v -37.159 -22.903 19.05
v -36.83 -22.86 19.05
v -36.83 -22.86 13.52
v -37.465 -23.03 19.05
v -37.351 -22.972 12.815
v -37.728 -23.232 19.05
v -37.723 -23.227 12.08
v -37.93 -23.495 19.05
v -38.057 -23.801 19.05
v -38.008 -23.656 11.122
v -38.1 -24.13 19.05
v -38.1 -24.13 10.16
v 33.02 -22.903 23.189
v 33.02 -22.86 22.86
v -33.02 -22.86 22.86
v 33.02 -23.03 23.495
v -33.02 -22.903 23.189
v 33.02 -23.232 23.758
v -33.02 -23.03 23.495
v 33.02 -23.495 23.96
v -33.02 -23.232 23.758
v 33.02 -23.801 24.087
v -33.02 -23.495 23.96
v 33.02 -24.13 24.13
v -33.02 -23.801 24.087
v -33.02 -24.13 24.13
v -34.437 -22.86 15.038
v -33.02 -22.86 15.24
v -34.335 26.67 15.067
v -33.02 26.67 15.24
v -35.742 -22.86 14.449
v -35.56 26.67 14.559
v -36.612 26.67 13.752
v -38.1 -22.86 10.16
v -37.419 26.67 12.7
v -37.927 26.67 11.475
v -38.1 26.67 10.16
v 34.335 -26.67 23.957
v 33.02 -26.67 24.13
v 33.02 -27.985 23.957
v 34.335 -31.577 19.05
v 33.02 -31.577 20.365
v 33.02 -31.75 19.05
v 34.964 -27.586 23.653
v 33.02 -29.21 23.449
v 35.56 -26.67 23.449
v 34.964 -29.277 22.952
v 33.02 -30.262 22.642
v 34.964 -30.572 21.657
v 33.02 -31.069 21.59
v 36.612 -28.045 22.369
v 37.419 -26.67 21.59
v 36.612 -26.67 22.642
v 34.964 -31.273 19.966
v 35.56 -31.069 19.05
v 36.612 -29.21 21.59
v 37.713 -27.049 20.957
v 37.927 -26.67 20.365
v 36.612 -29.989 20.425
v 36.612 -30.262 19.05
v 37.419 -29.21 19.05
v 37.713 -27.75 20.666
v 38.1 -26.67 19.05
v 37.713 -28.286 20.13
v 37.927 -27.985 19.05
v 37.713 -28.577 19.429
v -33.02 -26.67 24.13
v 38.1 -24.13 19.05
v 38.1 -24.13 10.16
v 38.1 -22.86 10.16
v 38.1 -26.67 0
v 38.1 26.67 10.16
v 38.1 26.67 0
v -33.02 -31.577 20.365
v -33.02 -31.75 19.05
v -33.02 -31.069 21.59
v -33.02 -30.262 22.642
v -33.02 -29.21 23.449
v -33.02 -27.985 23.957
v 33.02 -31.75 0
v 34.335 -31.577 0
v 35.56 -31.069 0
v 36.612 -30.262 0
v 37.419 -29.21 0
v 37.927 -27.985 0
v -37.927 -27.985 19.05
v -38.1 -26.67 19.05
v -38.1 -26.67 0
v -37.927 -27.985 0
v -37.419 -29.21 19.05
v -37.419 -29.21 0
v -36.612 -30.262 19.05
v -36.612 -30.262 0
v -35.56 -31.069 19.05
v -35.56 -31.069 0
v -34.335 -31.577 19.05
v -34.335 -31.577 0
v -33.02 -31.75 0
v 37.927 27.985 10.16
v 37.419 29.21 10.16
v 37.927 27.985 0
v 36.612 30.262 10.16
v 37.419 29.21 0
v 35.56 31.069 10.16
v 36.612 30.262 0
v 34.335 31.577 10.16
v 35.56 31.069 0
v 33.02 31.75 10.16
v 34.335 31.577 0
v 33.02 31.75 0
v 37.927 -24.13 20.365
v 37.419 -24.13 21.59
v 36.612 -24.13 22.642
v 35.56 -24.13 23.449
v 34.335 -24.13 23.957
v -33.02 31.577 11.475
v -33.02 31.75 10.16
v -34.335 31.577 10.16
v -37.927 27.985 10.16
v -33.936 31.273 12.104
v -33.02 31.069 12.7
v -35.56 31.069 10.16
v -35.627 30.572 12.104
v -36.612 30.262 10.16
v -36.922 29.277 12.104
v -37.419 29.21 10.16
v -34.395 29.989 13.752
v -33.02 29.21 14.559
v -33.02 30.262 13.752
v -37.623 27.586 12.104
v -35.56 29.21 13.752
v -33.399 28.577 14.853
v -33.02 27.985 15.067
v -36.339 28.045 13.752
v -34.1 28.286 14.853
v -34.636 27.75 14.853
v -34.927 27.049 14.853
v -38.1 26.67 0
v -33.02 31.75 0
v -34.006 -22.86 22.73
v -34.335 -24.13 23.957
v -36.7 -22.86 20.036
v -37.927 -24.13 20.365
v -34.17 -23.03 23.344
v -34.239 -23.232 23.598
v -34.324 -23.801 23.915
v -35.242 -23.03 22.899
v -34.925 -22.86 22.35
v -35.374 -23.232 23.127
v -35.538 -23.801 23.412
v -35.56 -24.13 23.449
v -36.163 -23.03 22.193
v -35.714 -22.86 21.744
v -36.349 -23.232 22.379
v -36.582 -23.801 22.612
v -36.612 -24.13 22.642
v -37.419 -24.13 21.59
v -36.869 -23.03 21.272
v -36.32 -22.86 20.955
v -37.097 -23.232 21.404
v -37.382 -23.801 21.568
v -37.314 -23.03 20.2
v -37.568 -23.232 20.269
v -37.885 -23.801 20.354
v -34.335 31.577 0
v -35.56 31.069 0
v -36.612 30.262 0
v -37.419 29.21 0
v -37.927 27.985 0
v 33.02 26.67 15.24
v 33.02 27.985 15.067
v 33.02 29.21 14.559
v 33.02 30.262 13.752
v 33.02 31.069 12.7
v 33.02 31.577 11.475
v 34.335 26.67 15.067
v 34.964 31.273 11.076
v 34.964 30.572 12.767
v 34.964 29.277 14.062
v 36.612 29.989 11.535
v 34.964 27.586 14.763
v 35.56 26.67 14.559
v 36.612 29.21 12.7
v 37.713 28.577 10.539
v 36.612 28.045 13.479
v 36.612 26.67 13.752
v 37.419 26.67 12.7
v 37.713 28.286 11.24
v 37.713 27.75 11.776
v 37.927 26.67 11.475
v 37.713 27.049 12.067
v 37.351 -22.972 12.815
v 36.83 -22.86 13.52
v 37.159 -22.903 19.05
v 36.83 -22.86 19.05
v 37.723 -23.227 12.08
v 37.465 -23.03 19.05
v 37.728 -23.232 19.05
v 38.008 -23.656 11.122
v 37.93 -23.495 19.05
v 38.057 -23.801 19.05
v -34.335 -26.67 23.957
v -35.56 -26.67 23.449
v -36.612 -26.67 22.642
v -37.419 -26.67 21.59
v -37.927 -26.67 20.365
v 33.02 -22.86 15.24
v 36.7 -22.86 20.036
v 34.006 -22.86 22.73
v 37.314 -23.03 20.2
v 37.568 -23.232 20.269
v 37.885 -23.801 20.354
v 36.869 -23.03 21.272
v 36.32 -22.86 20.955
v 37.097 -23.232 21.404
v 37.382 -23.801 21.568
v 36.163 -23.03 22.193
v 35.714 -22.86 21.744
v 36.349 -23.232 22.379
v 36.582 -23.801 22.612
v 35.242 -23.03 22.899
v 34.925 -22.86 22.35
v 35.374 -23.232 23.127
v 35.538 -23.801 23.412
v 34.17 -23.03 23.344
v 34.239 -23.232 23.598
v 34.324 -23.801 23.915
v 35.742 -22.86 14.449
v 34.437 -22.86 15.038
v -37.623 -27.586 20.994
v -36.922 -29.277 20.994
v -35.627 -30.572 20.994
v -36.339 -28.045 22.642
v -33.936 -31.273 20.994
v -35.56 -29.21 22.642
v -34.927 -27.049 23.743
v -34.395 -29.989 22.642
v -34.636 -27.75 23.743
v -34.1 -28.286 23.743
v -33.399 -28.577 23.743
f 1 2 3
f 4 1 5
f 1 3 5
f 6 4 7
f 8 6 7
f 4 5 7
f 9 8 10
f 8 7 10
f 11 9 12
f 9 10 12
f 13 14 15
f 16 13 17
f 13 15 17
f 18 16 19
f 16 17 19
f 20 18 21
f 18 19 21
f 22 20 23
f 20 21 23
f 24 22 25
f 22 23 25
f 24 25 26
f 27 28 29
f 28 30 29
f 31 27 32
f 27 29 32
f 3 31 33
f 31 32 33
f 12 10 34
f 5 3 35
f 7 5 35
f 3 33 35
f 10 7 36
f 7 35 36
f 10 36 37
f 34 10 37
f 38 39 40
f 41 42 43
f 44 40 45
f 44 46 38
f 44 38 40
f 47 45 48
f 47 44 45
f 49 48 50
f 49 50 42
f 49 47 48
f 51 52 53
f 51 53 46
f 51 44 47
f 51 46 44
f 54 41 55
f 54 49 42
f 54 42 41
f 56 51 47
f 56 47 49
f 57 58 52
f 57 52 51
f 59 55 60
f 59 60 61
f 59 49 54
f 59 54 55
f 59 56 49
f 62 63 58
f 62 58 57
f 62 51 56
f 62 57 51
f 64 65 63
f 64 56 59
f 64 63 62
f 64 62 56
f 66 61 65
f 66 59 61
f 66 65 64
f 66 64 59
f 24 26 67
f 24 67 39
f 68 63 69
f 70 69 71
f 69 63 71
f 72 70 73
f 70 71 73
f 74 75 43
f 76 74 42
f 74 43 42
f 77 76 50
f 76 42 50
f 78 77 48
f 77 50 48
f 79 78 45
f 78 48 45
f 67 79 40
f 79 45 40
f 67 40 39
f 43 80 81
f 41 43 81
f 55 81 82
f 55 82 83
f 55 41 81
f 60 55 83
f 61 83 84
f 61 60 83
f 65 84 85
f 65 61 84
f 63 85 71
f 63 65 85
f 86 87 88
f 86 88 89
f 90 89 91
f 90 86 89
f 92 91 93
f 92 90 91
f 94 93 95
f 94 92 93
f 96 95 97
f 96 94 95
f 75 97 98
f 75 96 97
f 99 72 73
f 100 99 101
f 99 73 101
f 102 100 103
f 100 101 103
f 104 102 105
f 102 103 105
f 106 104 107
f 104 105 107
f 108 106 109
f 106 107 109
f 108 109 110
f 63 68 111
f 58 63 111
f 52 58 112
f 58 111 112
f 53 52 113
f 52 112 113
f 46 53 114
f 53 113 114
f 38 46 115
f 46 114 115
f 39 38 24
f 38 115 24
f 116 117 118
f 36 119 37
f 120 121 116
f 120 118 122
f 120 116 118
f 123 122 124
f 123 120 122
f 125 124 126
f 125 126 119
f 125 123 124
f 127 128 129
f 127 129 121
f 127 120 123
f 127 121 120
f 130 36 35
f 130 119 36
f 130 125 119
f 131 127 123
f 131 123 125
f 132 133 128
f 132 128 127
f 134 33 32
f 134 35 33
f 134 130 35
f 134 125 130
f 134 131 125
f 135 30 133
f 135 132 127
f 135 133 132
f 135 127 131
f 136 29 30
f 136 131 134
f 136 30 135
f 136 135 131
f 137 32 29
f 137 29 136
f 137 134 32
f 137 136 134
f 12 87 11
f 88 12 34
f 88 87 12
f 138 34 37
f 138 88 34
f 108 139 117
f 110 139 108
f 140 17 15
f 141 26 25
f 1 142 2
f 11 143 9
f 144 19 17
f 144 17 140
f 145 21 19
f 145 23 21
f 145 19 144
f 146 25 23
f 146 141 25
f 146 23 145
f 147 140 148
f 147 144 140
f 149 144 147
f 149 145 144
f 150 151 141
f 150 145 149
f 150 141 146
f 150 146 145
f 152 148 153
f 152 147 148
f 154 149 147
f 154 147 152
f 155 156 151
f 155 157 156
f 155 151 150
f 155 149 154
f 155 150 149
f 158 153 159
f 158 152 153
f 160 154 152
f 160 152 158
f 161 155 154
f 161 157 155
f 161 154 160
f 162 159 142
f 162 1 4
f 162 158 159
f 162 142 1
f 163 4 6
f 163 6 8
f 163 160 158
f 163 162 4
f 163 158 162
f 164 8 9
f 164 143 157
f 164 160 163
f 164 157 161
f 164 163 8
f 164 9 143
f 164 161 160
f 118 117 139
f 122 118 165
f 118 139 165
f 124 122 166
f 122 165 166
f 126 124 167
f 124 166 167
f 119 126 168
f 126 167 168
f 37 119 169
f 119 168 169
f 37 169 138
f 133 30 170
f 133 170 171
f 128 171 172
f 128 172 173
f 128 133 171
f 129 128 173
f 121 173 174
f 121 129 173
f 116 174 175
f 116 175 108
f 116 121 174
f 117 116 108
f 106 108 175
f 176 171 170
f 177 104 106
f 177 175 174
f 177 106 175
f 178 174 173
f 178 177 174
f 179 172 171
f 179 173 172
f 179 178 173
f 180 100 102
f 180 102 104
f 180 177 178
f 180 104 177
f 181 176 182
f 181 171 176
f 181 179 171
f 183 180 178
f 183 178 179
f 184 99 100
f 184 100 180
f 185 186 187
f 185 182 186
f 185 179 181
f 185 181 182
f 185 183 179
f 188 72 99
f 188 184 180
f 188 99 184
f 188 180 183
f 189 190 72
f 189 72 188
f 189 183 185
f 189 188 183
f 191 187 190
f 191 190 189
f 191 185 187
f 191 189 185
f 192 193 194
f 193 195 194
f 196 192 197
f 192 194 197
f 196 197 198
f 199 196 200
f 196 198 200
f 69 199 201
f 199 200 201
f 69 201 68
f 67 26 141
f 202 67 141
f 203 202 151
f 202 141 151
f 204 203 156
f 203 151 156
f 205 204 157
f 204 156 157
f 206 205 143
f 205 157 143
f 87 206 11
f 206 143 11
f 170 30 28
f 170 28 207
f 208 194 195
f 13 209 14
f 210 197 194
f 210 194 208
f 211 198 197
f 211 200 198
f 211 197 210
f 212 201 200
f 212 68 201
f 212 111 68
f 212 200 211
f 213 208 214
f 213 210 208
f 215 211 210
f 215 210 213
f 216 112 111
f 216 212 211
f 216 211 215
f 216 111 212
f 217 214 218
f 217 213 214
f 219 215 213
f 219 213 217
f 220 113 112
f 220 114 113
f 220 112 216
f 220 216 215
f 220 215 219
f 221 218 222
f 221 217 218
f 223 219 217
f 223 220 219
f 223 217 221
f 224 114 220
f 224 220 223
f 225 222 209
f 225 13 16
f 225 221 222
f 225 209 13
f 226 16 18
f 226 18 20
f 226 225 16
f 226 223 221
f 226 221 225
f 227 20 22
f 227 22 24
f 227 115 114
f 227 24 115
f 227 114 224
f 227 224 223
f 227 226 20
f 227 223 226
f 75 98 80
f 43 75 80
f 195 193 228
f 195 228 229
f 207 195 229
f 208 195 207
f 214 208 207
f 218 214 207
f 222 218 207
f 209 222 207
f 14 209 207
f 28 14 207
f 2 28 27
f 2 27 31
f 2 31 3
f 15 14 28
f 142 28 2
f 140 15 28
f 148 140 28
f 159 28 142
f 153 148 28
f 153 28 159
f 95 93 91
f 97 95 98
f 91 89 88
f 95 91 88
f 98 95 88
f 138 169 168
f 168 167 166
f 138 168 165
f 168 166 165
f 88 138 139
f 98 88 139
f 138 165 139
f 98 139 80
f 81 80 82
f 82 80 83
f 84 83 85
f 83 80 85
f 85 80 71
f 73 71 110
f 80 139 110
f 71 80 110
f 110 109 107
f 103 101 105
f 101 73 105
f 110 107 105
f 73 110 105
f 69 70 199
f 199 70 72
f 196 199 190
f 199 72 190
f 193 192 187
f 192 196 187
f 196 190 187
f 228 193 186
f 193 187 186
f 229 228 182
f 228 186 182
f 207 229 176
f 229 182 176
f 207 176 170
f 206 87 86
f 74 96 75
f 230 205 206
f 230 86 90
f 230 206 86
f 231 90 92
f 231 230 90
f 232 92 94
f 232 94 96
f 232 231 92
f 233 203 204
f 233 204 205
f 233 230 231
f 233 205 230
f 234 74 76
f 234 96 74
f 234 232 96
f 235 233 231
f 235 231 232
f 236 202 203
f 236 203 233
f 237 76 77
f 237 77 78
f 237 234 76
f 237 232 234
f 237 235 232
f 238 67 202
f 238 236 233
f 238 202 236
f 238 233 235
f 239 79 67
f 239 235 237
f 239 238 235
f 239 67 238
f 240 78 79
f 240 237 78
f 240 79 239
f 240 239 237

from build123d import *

# Parameters (mm, degrees)
F0_W         = 76.2
F0_H         = 63.5
F1_DEPTH     = 15.24
F2_W         = 76.2
F2_H         = 8.89
F3_DEPTH     = 8.89
F4_R         = 5.08
F5_T1_DEPTH  = 16.51
F5_T3_DEPTH  = 49.53
F5_T5_DEPTH  = 66.04
F5_T7_DEPTH  = 22.86
F5_S11_W     = 5.08
F5_S11_H     = 5.08
F5_T12_DEPTH = 5.08
F5_S17_W     = 5.08
F5_S17_H     = 5.08
F5_T18_DEPTH = 5.08
F5_S23_W     = 5.08
F5_S23_H     = 5.08
F5_T24_DEPTH = 5.08
F5_S29_W     = 5.08
F5_S29_H     = 5.08
F5_T30_DEPTH = 5.08
F6_R         = 1.27


# Not quite as in the source:
# - a fillet or chamfer that OpenCascade refuses, or shapes differently, is made with other operations: its cross-section is extruded or revolved along the edge and cut away or added


with BuildPart() as f1:
    # F0 (on Top) → F1 (new body)
    with BuildSketch(Plane.XY):
        Rectangle(F0_W, F0_H)
    extrude(amount=F1_DEPTH)

    # F2 (on face) → F3 (join)
    with BuildSketch(Plane.XY.offset(15.24)):
        with Locations((0, -27.305)):
            Rectangle(F2_W, F2_H)
    extrude(amount=F3_DEPTH)

    # F4
    f4_edges = [f1.edges().sort_by_distance(p)[0] for p in [
        (38.1, -31.75, 12.065),
        (-38.1, -31.75, 12.065),
        (0, -31.75, 24.13),
    ]]
    fillet(f4_edges, radius=F4_R)

    # F5: fillet of radius 5.08 on 7 edges, made by hand

    # F5_s2 → F5_t1 (cut)
    with BuildSketch(Plane.XZ.offset(10.16)):
        with BuildLine():
            ThreePointArc((-33.02, 24.13), (-36.6121024484, 22.6421024484), (-38.1, 19.05))
            Line((-38.1, 19.05), (-38.1, 24.13))
            Line((-38.1, 24.13), (-33.02, 24.13))
        make_face()
        with BuildLine():
            ThreePointArc((38.1, 19.05), (36.6121024484, 22.6421024484), (33.02, 24.13))
            Line((33.02, 24.13), (38.1, 24.13))
            Line((38.1, 24.13), (38.1, 19.05))
        make_face()
    extrude(amount=F5_T1_DEPTH, mode=Mode.SUBTRACT)

    # F5_s4 → F5_t3 (cut)
    with BuildSketch(Plane.XZ.offset(-26.67)):
        with BuildLine():
            ThreePointArc((-33.02, 15.24), (-36.6121024484, 13.7521024484), (-38.1, 10.16))
            Line((-38.1, 10.16), (-38.1, 15.24))
            Line((-38.1, 15.24), (-33.02, 15.24))
        make_face()
        with BuildLine():
            ThreePointArc((38.1, 10.16), (36.6121024484, 13.7521024484), (33.02, 15.24))
            Line((33.02, 15.24), (38.1, 15.24))
            Line((38.1, 15.24), (38.1, 10.16))
        make_face()
    extrude(amount=F5_T3_DEPTH, mode=Mode.SUBTRACT)

    # F5_s6 → F5_t5 (cut)
    with BuildSketch(Plane.YZ.offset(-33.02)):
        with BuildLine():
            ThreePointArc((26.67, 15.24), (30.2621024484, 13.7521024484), (31.75, 10.16))
            Line((31.75, 10.16), (31.75, 15.24))
            Line((31.75, 15.24), (26.67, 15.24))
        make_face()
    extrude(amount=F5_T5_DEPTH, mode=Mode.SUBTRACT)

    # F5_s8 → F5_t7 (cut)
    with BuildSketch(Plane.XY.offset(-12.7)):
        with BuildLine():
            ThreePointArc((38.1, 26.67), (36.6121024484, 30.2621024484), (33.02, 31.75))
            Line((33.02, 31.75), (38.1, 31.75))
            Line((38.1, 31.75), (38.1, 26.67))
        make_face()
        with BuildLine():
            ThreePointArc((-33.02, 31.75), (-36.6121024484, 30.2621024484), (-38.1, 26.67))
            Line((-38.1, 26.67), (-38.1, 31.75))
            Line((-38.1, 31.75), (-33.02, 31.75))
        make_face()
    extrude(amount=F5_T7_DEPTH, mode=Mode.SUBTRACT)


with BuildPart() as f5_tool10:
    # F5_s11 → F5_t12 (new body)
    with BuildSketch(Plane.YZ.offset(33.02)):
        with Locations((-29.21, 21.59)):
            Rectangle(F5_S11_W, F5_S11_H)
    extrude(amount=F5_T12_DEPTH)

    # F5_s13 → F5_t14 (revolve, cut)
    with BuildSketch(Plane(origin=(33.02, -26.67, 19.05), x_dir=(0, 0.7071067812, -0.7071067812), z_dir=(0, -0.7071067812, -0.7071067812))):
        with BuildLine():
            ThreePointArc((0, -5.08), (5.08, 0), (0, 5.08))
            Line((0, 5.08), (0, -5.08))
        make_face()
    revolve(axis=Axis((33.02, -26.67, 19.05), (1, 0, 0)), mode=Mode.SUBTRACT)


with BuildPart() as f1_1:
    add(f1.part)

    # F5_t9: cut F5_tool10
    add(f5_tool10.part, mode=Mode.SUBTRACT)


with BuildPart() as f5_tool16:
    # F5_s17 → F5_t18 (new body)
    with BuildSketch(Plane.XY.offset(19.05)):
        with Locations((-35.56, -29.21)):
            Rectangle(F5_S17_W, F5_S17_H)
    extrude(amount=F5_T18_DEPTH)

    # F5_s19 → F5_t20 (revolve, cut)
    with BuildSketch(Plane(origin=(-33.02, -26.67, 19.05), x_dir=(0.7071067812, 0.7071067812, 0), z_dir=(0.7071067812, -0.7071067812, 0))):
        with BuildLine():
            ThreePointArc((0, -5.08), (5.08, 0), (0, 5.08))
            Line((0, 5.08), (0, -5.08))
        make_face()
    revolve(axis=Axis((-33.02, -26.67, 19.05), (0, 0, 1)), mode=Mode.SUBTRACT)


with BuildPart() as f1_2:
    add(f1_1.part)

    # F5_t15: cut F5_tool16
    add(f5_tool16.part, mode=Mode.SUBTRACT)


with BuildPart() as f5_tool22:
    # F5_s23 → F5_t24 (new body)
    with BuildSketch(Plane.XY.offset(10.16)):
        with Locations((-35.56, 29.21)):
            Rectangle(F5_S23_W, F5_S23_H)
    extrude(amount=F5_T24_DEPTH)

    # F5_s25 → F5_t26 (revolve, cut)
    with BuildSketch(Plane(origin=(-33.02, 26.67, 10.16), x_dir=(0.7071067812, -0.7071067812, 0), z_dir=(-0.7071067812, -0.7071067812, 0))):
        with BuildLine():
            ThreePointArc((0, -5.08), (5.08, 0), (0, 5.08))
            Line((0, 5.08), (0, -5.08))
        make_face()
    revolve(axis=Axis((-33.02, 26.67, 10.16), (0, 0, 1)), mode=Mode.SUBTRACT)


with BuildPart() as f1_3:
    add(f1_2.part)

    # F5_t21: cut F5_tool22
    add(f5_tool22.part, mode=Mode.SUBTRACT)


with BuildPart() as f5_tool28:
    # F5_s29 → F5_t30 (new body)
    with BuildSketch(Plane.YZ.offset(33.02)):
        with Locations((29.21, 12.7)):
            Rectangle(F5_S29_W, F5_S29_H)
    extrude(amount=F5_T30_DEPTH)

    # F5_s31 → F5_t32 (revolve, cut)
    with BuildSketch(Plane(origin=(33.02, 26.67, 10.16), x_dir=(0, -0.7071067812, -0.7071067812), z_dir=(0, -0.7071067812, 0.7071067812))):
        with BuildLine():
            ThreePointArc((0, -5.08), (5.08, 0), (0, 5.08))
            Line((0, 5.08), (0, -5.08))
        make_face()
    revolve(axis=Axis((33.02, 26.67, 10.16), (1, 0, 0)), mode=Mode.SUBTRACT)


with BuildPart() as f1_4:
    add(f1_3.part)

    # F5_t27: cut F5_tool28
    add(f5_tool28.part, mode=Mode.SUBTRACT)

    # F6
    f6_edges = [f1_4.edges().sort_by_distance(p)[0] for p in [
        (38.1, -22.86, 14.605),
        (36.612102, -22.86, 22.642102),
        (-38.1, -22.86, 14.605),
        (-36.612102, -22.86, 22.642102),
        (0, -22.86, 24.13),
    ]]
    fillet(f6_edges, radius=F6_R)


solid = f1_4.part
